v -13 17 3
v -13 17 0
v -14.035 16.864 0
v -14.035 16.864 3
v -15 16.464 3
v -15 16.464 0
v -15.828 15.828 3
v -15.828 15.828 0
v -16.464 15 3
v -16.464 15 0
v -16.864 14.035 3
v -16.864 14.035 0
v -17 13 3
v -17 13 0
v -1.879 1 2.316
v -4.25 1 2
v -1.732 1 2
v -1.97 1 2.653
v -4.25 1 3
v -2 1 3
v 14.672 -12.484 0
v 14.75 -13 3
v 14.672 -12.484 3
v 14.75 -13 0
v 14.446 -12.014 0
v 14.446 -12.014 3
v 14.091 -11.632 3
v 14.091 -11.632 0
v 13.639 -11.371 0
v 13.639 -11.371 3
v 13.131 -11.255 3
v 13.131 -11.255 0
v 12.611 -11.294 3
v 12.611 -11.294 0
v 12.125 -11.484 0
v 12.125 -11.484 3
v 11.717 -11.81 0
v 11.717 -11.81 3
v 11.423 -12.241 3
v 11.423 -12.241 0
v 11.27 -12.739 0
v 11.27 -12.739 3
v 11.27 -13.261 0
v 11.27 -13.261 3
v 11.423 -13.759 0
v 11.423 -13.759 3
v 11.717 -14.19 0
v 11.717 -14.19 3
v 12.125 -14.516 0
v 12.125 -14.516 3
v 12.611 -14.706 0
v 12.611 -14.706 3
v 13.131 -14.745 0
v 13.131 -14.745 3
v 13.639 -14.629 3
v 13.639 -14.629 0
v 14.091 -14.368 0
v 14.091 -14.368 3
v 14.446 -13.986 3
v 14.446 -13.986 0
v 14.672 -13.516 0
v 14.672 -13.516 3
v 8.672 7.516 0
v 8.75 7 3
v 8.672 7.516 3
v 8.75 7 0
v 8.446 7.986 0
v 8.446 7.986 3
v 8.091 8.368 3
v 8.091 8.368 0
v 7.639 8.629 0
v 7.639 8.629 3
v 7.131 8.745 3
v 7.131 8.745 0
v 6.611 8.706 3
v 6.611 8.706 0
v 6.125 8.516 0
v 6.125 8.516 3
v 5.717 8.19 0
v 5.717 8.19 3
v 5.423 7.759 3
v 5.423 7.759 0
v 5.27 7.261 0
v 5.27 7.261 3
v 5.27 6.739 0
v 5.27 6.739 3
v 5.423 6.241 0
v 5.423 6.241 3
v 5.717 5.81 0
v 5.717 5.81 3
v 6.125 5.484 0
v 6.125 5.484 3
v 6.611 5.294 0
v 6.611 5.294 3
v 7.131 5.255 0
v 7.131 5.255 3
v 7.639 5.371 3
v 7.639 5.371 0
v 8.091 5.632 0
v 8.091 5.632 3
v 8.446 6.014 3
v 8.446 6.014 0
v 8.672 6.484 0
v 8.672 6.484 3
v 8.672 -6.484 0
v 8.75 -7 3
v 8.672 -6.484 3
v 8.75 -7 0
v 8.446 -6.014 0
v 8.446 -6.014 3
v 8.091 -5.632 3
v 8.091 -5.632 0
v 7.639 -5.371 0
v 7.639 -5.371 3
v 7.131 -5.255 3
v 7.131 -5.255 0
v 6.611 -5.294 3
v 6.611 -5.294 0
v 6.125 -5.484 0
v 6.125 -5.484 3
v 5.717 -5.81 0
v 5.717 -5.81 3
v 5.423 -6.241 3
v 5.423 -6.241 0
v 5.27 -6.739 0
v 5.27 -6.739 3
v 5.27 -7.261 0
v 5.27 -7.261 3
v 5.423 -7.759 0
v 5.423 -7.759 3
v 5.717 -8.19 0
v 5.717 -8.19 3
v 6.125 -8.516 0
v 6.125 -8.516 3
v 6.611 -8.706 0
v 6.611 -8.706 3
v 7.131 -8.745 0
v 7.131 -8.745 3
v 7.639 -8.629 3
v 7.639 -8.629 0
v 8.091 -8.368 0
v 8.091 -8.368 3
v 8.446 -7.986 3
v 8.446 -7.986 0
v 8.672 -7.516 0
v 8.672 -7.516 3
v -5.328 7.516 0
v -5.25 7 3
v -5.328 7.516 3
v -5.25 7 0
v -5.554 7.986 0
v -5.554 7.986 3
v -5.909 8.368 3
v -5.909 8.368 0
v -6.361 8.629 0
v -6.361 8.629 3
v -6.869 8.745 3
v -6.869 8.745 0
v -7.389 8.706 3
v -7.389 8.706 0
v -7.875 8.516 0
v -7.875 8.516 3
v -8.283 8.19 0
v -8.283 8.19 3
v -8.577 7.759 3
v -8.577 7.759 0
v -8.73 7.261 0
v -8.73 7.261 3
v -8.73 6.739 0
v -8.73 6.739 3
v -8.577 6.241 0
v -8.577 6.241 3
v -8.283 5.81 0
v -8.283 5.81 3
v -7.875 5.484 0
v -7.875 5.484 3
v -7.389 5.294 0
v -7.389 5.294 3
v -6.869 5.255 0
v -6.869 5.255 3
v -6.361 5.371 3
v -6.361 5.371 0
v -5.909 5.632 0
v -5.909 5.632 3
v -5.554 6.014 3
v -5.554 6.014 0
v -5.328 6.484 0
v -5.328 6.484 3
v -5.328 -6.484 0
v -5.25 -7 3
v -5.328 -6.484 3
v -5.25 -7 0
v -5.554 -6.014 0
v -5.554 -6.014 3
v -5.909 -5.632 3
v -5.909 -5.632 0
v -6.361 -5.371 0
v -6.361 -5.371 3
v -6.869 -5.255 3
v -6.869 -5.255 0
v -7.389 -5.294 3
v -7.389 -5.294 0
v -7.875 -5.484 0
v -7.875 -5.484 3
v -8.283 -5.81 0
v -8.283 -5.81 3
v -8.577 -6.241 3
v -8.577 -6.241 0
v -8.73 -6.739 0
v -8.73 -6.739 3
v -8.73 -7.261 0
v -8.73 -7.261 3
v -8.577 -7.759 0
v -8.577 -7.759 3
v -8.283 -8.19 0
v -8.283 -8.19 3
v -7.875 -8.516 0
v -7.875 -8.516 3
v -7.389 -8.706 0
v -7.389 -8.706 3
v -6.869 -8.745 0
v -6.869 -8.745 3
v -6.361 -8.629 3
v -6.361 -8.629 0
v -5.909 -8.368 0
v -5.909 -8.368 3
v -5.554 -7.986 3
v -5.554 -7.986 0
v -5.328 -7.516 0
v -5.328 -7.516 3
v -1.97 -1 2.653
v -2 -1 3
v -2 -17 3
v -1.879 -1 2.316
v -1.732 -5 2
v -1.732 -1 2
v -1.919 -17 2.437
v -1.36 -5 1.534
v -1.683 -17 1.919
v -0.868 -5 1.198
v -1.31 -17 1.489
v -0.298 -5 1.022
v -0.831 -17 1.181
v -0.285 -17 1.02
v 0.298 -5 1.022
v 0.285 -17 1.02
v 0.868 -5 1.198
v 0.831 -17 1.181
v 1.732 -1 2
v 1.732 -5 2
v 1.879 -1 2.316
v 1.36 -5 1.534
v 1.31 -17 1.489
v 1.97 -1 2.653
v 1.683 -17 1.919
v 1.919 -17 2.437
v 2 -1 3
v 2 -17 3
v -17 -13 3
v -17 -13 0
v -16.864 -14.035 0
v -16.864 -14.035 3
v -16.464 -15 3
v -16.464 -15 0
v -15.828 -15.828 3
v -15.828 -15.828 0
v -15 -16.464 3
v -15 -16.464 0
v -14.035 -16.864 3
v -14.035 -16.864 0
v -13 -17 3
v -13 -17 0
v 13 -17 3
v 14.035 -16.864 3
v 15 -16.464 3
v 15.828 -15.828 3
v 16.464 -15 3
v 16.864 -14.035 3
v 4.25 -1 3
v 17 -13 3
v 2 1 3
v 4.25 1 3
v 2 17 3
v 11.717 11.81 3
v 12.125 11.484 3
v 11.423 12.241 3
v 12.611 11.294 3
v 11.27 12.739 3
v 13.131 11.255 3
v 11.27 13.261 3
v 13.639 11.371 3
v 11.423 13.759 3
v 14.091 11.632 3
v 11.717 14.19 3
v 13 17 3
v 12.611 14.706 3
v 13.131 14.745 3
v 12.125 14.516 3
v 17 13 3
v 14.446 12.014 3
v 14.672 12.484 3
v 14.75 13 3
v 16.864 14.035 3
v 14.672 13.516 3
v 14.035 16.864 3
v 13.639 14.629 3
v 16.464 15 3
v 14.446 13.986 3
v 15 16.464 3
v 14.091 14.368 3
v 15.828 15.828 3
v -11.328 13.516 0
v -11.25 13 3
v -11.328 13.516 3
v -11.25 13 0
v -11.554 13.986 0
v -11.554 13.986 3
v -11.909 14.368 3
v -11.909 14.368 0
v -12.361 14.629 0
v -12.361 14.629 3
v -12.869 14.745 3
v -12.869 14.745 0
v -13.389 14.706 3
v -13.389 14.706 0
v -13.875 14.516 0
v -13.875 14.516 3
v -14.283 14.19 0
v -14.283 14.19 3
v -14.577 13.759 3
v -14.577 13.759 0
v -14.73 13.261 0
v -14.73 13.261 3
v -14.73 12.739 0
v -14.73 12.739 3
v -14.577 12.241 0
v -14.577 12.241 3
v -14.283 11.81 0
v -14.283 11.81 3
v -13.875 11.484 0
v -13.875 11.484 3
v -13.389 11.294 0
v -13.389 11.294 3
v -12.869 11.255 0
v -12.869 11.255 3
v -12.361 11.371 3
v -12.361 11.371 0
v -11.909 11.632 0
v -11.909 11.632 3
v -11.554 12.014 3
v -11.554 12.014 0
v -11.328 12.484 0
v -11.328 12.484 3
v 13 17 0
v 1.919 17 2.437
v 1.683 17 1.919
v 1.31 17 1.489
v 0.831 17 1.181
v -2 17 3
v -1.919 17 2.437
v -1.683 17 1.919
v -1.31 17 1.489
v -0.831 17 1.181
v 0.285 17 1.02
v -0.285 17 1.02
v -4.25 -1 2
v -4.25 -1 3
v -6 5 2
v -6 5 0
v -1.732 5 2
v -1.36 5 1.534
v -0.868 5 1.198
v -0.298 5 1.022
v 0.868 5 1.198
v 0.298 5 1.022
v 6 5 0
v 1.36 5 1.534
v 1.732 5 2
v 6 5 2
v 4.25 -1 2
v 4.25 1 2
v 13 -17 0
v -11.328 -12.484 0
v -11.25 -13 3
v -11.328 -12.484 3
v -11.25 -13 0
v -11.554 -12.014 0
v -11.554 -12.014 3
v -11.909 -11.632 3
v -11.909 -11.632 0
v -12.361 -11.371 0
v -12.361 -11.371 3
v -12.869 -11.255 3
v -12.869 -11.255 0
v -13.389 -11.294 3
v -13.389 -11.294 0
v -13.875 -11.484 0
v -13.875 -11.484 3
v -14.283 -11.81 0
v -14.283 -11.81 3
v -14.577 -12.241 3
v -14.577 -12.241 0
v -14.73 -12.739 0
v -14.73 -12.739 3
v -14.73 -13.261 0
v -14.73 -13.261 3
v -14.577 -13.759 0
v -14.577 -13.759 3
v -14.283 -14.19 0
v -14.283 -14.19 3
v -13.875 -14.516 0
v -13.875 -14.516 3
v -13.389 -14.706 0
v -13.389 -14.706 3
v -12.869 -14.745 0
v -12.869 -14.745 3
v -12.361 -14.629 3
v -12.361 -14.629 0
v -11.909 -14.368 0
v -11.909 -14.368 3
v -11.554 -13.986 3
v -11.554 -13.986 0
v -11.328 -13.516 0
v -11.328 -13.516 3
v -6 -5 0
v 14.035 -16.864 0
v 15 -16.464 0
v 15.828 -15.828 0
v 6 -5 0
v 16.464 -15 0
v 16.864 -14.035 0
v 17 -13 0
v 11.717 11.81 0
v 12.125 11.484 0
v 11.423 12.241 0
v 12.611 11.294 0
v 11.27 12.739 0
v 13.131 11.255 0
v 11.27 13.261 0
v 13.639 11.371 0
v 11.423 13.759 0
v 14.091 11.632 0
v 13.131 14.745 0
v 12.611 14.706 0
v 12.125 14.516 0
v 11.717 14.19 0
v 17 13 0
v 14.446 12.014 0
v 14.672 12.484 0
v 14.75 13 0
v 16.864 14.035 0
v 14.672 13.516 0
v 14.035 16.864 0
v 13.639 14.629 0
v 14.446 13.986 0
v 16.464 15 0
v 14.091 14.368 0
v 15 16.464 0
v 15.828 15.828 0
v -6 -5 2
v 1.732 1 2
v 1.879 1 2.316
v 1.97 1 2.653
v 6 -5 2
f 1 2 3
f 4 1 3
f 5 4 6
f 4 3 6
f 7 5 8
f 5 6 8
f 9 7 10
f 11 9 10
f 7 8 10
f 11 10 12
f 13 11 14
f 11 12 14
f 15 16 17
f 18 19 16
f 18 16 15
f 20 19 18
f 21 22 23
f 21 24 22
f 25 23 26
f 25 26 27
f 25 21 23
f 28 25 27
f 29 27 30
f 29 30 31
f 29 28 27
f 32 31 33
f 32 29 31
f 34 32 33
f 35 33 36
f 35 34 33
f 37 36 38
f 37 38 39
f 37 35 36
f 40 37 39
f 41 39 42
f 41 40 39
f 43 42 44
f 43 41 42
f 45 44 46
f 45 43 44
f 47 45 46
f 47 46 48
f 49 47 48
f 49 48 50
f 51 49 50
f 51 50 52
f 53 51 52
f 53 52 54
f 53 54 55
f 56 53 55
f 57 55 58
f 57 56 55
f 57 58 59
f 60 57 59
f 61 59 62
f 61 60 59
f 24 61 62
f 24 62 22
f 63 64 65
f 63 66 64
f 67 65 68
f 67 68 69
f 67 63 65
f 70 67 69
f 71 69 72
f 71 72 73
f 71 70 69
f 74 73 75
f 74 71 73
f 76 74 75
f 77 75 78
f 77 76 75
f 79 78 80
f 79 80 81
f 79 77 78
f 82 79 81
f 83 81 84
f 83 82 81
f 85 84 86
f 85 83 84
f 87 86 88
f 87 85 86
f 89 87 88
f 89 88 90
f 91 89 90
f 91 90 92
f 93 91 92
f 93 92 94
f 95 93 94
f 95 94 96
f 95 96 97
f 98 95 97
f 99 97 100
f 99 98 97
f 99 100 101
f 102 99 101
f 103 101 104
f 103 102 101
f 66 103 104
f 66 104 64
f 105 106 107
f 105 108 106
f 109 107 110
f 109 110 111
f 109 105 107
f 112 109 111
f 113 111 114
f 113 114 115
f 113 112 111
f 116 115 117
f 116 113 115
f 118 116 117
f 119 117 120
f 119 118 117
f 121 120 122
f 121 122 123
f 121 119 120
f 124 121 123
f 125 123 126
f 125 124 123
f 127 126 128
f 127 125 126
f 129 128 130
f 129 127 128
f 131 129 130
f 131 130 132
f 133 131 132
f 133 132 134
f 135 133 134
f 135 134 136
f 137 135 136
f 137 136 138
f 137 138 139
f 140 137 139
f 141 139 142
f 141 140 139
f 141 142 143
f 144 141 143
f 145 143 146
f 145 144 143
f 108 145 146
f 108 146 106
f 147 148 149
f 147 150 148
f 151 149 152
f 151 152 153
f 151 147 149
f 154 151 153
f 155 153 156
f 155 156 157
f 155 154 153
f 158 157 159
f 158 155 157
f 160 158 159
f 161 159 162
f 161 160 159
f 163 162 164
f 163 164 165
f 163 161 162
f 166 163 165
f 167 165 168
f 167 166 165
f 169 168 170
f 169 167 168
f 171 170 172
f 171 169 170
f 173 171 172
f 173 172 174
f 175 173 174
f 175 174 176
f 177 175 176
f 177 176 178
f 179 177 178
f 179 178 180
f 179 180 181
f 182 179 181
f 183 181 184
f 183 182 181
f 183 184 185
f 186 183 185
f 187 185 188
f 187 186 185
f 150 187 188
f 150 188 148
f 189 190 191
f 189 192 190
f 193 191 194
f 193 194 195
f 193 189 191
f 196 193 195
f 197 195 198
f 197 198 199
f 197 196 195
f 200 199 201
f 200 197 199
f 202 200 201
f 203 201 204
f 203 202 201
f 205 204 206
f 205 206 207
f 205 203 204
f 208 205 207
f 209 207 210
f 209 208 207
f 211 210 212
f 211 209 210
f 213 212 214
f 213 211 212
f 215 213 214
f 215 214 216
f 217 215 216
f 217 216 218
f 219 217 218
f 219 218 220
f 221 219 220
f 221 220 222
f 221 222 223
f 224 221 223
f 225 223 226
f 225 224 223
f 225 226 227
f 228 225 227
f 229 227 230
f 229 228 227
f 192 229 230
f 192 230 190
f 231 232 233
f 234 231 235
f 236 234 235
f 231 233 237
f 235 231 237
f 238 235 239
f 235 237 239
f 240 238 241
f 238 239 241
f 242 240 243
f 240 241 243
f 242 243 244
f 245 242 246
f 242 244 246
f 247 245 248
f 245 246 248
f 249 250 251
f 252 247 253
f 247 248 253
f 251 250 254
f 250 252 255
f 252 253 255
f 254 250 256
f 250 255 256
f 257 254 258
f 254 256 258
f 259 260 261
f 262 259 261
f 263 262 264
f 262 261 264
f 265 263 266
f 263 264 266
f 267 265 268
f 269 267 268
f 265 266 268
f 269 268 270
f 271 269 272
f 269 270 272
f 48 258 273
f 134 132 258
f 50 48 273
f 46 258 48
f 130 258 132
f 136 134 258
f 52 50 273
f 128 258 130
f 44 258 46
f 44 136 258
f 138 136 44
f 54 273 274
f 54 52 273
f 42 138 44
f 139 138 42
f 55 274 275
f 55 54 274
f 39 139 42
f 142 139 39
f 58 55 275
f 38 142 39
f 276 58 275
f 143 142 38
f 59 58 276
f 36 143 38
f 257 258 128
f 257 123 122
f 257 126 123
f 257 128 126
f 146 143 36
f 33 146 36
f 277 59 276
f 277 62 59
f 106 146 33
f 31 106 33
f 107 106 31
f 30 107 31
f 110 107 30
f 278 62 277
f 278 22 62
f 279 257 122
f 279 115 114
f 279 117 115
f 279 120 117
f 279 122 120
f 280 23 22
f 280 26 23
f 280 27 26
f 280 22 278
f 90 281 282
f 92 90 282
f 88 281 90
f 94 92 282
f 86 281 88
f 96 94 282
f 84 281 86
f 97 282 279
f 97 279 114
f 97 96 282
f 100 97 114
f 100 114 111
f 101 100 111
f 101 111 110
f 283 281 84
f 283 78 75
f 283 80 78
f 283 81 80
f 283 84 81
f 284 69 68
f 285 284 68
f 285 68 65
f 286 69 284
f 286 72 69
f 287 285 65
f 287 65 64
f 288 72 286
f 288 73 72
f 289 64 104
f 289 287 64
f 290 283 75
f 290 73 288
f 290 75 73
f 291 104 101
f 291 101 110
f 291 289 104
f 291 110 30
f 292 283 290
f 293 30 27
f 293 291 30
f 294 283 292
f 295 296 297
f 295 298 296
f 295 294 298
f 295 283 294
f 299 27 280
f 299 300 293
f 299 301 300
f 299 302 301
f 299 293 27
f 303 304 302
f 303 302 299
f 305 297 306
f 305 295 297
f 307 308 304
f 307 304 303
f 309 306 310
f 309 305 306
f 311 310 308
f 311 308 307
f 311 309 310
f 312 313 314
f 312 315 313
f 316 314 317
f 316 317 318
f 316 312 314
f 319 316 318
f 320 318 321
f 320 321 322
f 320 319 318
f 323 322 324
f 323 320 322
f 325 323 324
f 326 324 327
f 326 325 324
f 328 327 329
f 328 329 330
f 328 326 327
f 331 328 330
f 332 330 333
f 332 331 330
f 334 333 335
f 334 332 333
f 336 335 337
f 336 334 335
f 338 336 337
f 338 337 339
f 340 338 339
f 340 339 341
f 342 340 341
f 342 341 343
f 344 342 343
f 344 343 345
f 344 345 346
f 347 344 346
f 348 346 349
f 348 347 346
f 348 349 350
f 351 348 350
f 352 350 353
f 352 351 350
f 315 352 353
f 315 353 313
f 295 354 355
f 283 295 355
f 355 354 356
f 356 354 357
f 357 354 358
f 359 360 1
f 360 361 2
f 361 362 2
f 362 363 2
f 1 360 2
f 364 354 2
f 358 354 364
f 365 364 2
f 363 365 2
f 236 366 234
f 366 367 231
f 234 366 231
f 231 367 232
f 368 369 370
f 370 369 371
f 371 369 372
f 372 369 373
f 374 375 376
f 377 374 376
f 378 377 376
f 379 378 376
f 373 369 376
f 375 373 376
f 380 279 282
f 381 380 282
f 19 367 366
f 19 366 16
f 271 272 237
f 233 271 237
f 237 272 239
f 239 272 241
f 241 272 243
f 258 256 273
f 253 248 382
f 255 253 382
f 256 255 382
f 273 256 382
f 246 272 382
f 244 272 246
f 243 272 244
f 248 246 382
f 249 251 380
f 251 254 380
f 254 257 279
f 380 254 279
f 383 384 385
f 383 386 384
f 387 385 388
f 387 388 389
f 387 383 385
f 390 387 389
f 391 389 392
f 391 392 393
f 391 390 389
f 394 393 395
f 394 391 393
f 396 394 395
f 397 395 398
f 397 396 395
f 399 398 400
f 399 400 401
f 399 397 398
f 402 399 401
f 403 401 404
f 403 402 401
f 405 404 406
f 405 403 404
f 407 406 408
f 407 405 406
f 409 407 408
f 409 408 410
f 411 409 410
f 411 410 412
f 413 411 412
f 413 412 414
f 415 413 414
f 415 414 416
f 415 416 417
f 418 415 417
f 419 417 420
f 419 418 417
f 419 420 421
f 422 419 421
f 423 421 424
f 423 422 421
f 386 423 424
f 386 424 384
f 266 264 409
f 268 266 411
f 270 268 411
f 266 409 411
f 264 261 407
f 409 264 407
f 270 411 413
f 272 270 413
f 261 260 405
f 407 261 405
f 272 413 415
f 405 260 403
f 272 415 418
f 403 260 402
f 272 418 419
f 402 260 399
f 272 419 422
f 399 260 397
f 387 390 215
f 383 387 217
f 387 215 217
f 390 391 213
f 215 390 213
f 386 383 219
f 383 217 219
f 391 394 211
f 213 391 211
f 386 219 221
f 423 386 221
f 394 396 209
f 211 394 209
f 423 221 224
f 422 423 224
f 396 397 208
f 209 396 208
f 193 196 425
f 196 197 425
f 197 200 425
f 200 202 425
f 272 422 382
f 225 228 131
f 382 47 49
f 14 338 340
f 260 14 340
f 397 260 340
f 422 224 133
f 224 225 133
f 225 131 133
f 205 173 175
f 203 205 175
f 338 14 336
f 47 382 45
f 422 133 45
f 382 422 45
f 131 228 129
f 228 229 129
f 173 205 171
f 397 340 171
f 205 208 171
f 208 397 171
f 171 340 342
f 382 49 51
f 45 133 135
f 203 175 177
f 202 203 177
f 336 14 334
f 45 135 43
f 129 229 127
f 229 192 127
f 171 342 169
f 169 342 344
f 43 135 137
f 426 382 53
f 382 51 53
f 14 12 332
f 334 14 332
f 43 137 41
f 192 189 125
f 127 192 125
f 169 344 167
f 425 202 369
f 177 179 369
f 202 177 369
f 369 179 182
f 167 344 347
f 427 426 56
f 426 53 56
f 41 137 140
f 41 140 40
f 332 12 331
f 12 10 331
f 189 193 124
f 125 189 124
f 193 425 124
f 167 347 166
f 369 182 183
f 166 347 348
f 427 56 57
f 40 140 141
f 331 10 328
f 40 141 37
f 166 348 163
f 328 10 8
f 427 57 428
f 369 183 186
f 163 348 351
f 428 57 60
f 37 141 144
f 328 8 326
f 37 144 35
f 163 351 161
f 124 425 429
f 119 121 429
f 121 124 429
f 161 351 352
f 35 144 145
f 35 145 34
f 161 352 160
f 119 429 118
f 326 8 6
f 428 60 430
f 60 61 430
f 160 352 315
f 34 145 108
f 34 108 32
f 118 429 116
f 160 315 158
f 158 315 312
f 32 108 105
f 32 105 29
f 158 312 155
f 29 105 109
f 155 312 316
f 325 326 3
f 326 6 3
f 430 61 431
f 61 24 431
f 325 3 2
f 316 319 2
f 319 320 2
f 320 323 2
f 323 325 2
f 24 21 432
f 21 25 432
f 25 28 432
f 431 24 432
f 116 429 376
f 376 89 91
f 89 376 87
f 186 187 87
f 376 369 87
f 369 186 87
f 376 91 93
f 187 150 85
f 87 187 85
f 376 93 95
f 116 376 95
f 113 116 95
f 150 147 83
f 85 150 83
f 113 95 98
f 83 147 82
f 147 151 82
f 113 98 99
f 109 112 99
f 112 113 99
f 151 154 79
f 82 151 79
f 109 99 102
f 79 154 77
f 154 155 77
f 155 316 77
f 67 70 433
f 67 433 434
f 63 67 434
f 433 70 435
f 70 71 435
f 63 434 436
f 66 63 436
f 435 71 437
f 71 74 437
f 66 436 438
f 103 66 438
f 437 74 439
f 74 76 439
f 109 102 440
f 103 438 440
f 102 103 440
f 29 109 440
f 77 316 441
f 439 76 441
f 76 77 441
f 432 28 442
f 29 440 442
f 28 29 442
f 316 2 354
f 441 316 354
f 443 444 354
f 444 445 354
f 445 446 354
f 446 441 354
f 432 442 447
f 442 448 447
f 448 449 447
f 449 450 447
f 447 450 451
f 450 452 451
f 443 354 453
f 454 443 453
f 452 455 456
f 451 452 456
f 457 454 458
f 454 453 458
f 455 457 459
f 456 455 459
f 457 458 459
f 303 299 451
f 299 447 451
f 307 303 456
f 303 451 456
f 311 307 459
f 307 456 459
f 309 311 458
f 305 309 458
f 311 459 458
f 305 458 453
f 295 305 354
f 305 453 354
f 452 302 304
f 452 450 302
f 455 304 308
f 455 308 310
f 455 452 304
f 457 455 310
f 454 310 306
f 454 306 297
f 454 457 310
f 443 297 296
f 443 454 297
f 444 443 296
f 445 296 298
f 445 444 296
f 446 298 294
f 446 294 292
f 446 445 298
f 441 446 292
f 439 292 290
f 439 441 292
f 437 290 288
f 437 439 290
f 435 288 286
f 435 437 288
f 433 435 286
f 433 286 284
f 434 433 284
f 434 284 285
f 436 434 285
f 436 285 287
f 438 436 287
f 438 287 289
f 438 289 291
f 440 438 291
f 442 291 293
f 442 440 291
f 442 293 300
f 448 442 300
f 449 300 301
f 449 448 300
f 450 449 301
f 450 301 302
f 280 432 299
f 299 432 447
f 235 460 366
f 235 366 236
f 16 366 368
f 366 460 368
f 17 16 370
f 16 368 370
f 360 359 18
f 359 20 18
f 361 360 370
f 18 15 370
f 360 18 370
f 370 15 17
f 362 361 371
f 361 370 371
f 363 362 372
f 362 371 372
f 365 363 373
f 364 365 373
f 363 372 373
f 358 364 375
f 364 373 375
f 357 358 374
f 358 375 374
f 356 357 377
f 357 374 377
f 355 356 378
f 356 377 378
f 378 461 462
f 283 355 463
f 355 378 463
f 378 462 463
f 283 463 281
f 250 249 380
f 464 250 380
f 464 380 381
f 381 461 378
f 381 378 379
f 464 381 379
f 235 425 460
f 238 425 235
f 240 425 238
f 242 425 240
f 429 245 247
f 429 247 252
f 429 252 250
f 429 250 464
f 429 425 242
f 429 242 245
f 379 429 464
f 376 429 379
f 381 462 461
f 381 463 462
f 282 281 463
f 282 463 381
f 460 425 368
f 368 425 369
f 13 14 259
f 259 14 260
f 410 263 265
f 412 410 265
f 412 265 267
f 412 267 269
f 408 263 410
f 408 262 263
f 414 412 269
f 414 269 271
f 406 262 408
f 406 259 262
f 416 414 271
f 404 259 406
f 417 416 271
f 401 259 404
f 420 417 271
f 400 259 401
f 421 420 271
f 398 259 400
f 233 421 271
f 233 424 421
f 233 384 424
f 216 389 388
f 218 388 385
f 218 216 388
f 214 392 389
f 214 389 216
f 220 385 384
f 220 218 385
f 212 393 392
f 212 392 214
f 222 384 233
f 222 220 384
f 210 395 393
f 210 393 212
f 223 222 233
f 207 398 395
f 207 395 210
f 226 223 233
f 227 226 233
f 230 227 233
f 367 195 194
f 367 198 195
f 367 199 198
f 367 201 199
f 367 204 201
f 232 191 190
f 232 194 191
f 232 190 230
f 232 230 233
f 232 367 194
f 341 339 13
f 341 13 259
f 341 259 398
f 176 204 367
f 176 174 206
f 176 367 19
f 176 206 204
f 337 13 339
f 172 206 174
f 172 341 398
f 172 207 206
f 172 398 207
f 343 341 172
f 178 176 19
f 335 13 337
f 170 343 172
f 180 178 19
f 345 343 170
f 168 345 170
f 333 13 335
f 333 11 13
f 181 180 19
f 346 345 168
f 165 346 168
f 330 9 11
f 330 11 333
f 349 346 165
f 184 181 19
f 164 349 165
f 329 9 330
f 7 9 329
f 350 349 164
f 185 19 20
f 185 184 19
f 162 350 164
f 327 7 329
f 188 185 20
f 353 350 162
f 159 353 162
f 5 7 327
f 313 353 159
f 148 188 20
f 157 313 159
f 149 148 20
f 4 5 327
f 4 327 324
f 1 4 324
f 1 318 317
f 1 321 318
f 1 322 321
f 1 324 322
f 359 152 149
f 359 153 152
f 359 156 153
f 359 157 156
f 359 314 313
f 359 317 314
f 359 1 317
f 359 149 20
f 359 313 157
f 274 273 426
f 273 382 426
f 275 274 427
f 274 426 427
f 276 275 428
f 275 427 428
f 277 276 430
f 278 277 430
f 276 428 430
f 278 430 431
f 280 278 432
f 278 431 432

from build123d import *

# Parameters (mm, degrees)
F0_R     = 1.75
F0_W     = 12
F0_H     = 10
F1_DEPTH = 2
F2_R     = 1.75
F3_DEPTH = 1
F4_R     = 2
F5_DEPTH = 34
F6_W     = 8.5
F6_H     = 2
F7_DEPTH = 5


with BuildPart() as f1:
    # F0 (on Top) → F1 (new body)
    with BuildSketch(Plane.XY):
        with BuildLine():
            ThreePointArc((-17, -13), (-15.828427, -15.828427), (-13, -17))
            Line((-13, -17), (13, -17))
            ThreePointArc((13, -17), (15.828427, -15.828427), (17, -13))
            Line((17, -13), (17, 13))
            ThreePointArc((17, 13), (15.828427, 15.828427), (13, 17))
            Line((13, 17), (-13, 17))
            ThreePointArc((-13, 17), (-15.828427, 15.828427), (-17, 13))
            Line((-17, 13), (-17, -13))
        make_face()
        with Locations((-13, -13)):
            Circle(F0_R, mode=Mode.SUBTRACT)
        with Locations((-7, -7)):
            Circle(F0_R, mode=Mode.SUBTRACT)
        with Locations((13, -13)):
            Circle(F0_R, mode=Mode.SUBTRACT)
        with Locations((7, -7)):
            Circle(F0_R, mode=Mode.SUBTRACT)
        with Locations((-7, 7)):
            Circle(F0_R, mode=Mode.SUBTRACT)
        with Locations((-13, 13)):
            Circle(F0_R, mode=Mode.SUBTRACT)
        Rectangle(F0_W, F0_H, mode=Mode.SUBTRACT)
        with Locations((7, 7)):
            Circle(F0_R, mode=Mode.SUBTRACT)
        with Locations((13, 13)):
            Circle(F0_R, mode=Mode.SUBTRACT)
    extrude(amount=F1_DEPTH)

    # F2 (on face) → F3 (join)
    with BuildSketch(Plane.XY.offset(2)):
        with BuildLine():
            ThreePointArc((-17, -13), (-15.828427, -15.828427), (-13, -17))
            Line((-13, -17), (13, -17))
            ThreePointArc((13, -17), (15.828427, -15.828427), (17, -13))
            Line((17, -13), (17, 13))
            ThreePointArc((17, 13), (15.828427, 15.828427), (13, 17))
            Line((13, 17), (-13, 17))
            ThreePointArc((-13, 17), (-15.828427, 15.828427), (-17, 13))
            Line((-17, 13), (-17, -13))
        make_face()
        with Locations((-13, -13)):
            Circle(F2_R, mode=Mode.SUBTRACT)
        with Locations((-7, -7)):
            Circle(F2_R, mode=Mode.SUBTRACT)
        with Locations((13, -13)):
            Circle(F2_R, mode=Mode.SUBTRACT)
        with Locations((7, -7)):
            Circle(F2_R, mode=Mode.SUBTRACT)
        with Locations((-7, 7)):
            Circle(F2_R, mode=Mode.SUBTRACT)
        with Locations((-13, 13)):
            Circle(F2_R, mode=Mode.SUBTRACT)
        with Locations((7, 7)):
            Circle(F2_R, mode=Mode.SUBTRACT)
        with Locations((13, 13)):
            Circle(F2_R, mode=Mode.SUBTRACT)
    extrude(amount=F3_DEPTH)


with BuildPart() as f5:
    # F4 (on face) → F5 (new body)
    with BuildSketch(Plane.XZ.offset(17)):
        with Locations((0, 3)):
            Circle(F4_R)
    extrude(amount=-F5_DEPTH)


with BuildPart() as f7:
    # F6 (on face) → F7 (new body)
    with BuildSketch(Plane.XY.offset(3)):
        Rectangle(F6_W, F6_H)
    extrude(amount=-F7_DEPTH)


with BuildPart() as f1_1:
    add(f1.part)

    # F8: cut F5, F7
    add(f5.part, mode=Mode.SUBTRACT)
    add(f7.part, mode=Mode.SUBTRACT)


solid = f1_1.part
